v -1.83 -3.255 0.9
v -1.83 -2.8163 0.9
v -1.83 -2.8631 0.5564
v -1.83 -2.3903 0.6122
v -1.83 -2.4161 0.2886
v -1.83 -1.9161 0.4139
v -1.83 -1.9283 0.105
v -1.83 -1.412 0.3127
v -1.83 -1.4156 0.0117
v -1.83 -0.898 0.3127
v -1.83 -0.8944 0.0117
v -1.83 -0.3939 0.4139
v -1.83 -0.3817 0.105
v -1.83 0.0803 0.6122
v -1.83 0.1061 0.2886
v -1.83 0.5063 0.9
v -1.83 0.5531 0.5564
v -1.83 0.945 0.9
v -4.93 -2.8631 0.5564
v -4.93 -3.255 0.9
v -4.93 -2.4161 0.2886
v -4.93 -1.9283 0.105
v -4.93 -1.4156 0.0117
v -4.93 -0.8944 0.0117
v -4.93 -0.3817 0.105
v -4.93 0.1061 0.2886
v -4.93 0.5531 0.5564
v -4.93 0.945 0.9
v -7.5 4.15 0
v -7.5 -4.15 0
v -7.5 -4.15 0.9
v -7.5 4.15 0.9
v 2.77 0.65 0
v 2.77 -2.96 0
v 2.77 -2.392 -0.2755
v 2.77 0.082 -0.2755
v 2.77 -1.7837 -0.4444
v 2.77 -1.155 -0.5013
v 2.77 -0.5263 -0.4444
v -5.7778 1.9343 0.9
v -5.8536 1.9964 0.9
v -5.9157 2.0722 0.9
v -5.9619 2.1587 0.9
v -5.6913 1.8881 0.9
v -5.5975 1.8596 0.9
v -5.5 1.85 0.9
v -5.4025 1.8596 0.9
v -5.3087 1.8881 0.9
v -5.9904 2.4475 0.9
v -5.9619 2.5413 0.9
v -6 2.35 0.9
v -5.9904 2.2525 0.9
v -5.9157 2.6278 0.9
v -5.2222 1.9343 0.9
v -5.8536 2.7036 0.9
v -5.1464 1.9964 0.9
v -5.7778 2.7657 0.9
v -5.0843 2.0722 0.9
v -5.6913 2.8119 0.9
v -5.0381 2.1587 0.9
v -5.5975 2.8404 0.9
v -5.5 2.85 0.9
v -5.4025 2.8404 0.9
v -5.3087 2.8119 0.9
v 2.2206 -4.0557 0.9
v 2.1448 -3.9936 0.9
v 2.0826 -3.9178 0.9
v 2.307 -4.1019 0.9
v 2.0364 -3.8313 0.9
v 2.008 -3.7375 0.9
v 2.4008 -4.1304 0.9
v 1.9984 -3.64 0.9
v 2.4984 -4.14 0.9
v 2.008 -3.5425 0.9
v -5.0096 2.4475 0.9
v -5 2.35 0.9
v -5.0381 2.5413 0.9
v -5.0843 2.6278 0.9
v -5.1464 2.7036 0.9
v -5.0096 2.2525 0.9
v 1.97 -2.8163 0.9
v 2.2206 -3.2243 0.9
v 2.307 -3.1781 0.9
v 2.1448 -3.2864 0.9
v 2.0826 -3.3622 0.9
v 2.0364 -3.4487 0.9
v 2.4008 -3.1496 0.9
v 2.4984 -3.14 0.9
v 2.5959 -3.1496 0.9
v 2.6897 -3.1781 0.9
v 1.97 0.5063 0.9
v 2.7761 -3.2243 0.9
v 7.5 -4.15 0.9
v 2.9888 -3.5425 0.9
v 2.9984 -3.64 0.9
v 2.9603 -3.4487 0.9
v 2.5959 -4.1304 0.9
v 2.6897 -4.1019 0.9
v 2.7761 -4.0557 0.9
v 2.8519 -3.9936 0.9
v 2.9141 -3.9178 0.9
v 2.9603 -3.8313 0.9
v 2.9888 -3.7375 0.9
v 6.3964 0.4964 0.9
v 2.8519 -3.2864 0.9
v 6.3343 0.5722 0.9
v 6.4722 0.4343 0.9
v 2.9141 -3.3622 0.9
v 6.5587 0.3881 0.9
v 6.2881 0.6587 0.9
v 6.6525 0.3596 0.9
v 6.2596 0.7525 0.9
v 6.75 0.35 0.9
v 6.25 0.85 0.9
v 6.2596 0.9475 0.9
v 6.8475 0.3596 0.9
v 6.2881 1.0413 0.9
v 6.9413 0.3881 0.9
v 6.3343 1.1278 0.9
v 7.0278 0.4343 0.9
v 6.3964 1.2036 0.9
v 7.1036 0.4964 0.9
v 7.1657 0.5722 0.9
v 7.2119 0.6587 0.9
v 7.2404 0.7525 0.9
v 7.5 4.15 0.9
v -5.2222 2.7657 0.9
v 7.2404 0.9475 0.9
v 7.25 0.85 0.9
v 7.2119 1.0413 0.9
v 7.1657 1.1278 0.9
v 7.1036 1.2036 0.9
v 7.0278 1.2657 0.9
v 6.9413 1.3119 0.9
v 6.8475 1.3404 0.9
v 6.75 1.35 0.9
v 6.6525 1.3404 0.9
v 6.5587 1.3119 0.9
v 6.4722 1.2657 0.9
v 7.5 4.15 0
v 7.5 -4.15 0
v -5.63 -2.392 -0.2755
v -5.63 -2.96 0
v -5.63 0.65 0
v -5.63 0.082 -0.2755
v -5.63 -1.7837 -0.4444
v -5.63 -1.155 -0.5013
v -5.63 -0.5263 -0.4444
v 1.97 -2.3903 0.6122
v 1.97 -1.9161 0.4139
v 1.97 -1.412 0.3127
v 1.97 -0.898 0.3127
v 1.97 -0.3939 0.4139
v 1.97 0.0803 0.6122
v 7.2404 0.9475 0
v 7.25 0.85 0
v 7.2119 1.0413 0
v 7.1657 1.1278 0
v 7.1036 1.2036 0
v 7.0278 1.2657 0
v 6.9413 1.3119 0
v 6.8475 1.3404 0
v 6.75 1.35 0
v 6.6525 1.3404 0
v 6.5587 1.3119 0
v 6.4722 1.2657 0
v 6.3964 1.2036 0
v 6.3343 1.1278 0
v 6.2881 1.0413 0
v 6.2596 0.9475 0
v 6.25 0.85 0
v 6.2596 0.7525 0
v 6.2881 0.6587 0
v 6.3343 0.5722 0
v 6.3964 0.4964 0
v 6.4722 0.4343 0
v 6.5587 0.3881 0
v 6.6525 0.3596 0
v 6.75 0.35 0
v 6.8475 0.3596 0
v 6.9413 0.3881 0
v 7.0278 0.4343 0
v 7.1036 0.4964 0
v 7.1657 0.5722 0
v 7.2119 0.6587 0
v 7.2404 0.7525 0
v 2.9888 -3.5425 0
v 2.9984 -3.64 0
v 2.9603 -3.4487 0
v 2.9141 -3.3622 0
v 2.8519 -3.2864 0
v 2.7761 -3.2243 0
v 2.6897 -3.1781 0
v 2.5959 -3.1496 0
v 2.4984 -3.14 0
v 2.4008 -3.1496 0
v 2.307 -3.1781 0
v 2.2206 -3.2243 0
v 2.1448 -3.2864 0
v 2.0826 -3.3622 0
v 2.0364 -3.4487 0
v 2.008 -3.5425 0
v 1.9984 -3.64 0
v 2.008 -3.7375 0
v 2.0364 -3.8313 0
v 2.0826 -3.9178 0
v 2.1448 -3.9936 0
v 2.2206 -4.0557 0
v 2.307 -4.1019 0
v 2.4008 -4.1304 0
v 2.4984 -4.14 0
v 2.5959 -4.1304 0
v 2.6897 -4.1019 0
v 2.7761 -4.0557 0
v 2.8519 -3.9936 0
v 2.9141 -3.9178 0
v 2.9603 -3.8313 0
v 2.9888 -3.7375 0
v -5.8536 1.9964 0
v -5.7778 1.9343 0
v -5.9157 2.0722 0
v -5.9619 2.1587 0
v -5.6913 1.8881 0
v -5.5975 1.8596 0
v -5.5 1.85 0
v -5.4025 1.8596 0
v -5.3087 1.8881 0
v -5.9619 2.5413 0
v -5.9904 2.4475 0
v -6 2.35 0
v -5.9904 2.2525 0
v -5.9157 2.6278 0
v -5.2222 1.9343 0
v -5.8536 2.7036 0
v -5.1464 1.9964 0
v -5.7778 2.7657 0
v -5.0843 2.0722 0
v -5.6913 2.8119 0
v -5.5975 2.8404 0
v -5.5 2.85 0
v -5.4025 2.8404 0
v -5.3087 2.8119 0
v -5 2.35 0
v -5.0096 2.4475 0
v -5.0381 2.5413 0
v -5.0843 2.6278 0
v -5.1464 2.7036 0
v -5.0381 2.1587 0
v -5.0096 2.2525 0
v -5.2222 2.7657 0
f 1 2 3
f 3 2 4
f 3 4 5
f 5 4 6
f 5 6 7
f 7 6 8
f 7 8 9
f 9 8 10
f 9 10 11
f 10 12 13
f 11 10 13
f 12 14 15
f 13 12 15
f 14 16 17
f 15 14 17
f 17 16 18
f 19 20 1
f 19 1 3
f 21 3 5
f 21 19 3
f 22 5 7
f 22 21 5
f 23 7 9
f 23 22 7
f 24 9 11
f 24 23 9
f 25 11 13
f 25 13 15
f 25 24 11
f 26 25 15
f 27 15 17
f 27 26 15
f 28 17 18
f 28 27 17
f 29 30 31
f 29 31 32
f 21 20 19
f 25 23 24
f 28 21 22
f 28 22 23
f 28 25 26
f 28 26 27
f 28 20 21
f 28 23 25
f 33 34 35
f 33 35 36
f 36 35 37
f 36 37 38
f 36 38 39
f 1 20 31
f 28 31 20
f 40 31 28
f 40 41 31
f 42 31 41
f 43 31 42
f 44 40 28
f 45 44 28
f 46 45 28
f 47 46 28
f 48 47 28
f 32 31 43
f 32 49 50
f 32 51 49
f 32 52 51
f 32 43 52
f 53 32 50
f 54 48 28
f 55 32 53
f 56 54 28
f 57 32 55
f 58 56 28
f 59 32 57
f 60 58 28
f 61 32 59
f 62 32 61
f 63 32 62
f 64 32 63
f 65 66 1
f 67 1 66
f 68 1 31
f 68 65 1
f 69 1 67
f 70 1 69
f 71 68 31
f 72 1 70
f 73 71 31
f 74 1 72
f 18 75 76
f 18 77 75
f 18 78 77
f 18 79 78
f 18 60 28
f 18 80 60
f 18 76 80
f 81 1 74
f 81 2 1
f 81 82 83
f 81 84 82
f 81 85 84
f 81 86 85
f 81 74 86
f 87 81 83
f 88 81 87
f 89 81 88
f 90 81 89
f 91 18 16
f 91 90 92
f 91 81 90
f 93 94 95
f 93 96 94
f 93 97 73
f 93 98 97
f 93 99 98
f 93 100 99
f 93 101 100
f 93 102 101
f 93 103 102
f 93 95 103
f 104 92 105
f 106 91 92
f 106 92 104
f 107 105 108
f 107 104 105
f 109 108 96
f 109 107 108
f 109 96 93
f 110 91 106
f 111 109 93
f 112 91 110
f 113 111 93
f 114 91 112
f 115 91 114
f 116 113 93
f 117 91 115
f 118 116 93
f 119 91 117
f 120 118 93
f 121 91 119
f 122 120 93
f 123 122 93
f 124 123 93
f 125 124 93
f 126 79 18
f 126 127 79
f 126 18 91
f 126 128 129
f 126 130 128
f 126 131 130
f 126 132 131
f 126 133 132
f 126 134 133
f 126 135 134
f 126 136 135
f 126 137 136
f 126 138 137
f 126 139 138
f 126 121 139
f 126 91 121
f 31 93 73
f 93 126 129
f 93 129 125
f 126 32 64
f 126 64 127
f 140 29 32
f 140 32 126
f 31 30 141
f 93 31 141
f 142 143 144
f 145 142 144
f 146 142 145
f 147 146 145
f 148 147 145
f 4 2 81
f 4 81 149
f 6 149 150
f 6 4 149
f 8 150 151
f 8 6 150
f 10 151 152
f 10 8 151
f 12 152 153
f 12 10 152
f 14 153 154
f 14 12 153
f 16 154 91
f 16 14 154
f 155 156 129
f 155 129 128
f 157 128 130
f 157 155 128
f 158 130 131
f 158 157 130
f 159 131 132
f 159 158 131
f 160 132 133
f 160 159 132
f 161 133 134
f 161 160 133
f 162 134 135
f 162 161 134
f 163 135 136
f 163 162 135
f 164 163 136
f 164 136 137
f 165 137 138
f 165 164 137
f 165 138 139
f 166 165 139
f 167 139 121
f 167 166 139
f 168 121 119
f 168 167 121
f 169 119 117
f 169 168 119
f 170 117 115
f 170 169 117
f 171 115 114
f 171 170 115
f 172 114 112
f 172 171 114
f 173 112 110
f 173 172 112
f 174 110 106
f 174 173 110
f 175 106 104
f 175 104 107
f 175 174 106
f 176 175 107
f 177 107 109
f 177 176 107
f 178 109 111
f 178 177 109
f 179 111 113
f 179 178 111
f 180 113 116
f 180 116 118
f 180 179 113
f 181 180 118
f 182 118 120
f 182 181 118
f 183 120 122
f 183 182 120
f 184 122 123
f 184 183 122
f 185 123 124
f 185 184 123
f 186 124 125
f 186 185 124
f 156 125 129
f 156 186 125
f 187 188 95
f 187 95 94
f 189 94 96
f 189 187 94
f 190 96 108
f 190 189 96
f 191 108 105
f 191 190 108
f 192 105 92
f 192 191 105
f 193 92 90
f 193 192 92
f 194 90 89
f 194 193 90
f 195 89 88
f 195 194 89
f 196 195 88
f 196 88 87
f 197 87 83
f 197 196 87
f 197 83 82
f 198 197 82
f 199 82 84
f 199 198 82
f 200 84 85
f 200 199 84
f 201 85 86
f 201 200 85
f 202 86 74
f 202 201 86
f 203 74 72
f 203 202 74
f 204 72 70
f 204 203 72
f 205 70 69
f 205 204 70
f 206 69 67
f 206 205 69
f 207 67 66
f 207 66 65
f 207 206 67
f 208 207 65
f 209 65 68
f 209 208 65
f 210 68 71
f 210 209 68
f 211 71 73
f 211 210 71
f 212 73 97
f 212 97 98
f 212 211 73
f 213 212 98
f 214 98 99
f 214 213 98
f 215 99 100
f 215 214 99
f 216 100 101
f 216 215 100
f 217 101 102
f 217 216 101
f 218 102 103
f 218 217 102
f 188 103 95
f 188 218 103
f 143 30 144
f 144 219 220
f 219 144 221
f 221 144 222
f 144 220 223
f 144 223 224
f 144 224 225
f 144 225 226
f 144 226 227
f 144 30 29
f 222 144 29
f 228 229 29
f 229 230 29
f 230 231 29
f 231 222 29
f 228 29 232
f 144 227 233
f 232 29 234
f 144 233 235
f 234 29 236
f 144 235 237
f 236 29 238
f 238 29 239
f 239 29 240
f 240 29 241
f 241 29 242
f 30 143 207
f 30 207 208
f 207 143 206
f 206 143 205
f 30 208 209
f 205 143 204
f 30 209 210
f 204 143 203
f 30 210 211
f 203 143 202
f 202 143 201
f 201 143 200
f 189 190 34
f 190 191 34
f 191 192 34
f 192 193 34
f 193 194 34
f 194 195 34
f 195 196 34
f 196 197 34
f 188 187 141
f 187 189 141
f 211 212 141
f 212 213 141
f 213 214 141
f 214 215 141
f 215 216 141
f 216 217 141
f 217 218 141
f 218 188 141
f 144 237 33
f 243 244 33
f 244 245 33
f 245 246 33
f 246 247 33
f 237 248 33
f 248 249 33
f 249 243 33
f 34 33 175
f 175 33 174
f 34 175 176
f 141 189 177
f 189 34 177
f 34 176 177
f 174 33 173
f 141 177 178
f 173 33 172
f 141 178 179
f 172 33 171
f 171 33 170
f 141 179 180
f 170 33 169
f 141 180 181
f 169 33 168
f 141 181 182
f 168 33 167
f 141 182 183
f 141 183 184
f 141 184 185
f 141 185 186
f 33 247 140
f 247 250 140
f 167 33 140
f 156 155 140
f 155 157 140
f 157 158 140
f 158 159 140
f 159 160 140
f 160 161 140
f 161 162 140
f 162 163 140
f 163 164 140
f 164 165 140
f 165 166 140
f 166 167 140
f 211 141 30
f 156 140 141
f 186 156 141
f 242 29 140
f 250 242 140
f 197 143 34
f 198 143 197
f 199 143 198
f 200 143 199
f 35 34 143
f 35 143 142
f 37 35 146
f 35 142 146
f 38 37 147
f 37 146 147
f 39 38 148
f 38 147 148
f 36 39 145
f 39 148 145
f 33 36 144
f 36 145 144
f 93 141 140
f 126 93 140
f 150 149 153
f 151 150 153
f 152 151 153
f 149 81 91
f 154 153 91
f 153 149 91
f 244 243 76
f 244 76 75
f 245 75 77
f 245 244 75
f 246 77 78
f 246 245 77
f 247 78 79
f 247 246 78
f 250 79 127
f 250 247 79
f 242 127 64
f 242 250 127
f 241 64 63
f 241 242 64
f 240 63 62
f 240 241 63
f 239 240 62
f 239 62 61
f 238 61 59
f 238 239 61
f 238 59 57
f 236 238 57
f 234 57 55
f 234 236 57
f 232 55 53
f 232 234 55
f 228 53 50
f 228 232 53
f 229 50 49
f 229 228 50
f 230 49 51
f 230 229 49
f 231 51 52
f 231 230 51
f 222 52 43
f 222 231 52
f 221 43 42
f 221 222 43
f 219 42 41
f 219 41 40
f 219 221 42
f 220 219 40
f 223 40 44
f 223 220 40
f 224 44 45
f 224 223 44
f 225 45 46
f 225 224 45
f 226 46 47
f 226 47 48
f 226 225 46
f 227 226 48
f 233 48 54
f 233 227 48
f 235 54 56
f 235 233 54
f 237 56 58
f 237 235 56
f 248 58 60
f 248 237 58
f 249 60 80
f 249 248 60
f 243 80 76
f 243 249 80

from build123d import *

# Parameters (mm, degrees)
SKETCH1_W            = 15
SKETCH1_H            = 8.3
SKETCH1_R            = 0.5
FRONT_FACE_EXT_DEPTH = 0.9
BOSS_EXTRUDE1_START  = -0.3
BOSS_EXTRUDE1_DEPTH  = 8.4
CUT_EXTRUDE5_START   = -1
CUT_EXTRUDE5_DEPTH   = 3.1
CUT_EXTRUDE6_DEPTH   = 3.8


with BuildPart() as part:
    # Sketch1 → Front Face Ext (new body)
    with BuildSketch(Plane.XY):
        Rectangle(SKETCH1_W, SKETCH1_H)
        with Locations((-5.5, 2.35)):
            Circle(SKETCH1_R, mode=Mode.SUBTRACT)
        with Locations((6.75, 0.85)):
            Circle(SKETCH1_R, mode=Mode.SUBTRACT)
        with Locations((2.498361092, -3.64)):
            Circle(SKETCH1_R, mode=Mode.SUBTRACT)
    extrude(amount=FRONT_FACE_EXT_DEPTH)

    # Sketch3 → Boss-Extrude1 (add)
    with BuildSketch(Plane.ZY.offset(5.93).offset(BOSS_EXTRUDE1_START)):
        with BuildLine():
            Line((0, 0.65), (0, -2.96))
            ThreePointArc((0, -2.96), (-0.501337798, -1.155), (0, 0.65))
        make_face()
    extrude(amount=-BOSS_EXTRUDE1_DEPTH)

    # Sketch4 → Cut-Extrude5 (cut)
    with BuildSketch(Plane.ZY.offset(5.93).offset(CUT_EXTRUDE5_START)):
        with BuildLine():
            Line((0.9, 0.945), (0.9, -3.255))
            ThreePointArc((0.9, -3.255), (0, -1.155), (0.9, 0.945))
        make_face()
    extrude(amount=-CUT_EXTRUDE5_DEPTH, mode=Mode.SUBTRACT)

    # Sketch6 → Cut-Extrude6 (cut)
    with BuildSketch(Plane.ZY.offset(1.83)):
        with BuildLine():
            Line((0.9, 0.506324773), (0.9, -2.816324773))
            ThreePointArc((0.9, -2.816324773), (0.3, -1.155), (0.9, 0.506324773))
        make_face()
    extrude(amount=-CUT_EXTRUDE6_DEPTH, mode=Mode.SUBTRACT)


solid = part.part
